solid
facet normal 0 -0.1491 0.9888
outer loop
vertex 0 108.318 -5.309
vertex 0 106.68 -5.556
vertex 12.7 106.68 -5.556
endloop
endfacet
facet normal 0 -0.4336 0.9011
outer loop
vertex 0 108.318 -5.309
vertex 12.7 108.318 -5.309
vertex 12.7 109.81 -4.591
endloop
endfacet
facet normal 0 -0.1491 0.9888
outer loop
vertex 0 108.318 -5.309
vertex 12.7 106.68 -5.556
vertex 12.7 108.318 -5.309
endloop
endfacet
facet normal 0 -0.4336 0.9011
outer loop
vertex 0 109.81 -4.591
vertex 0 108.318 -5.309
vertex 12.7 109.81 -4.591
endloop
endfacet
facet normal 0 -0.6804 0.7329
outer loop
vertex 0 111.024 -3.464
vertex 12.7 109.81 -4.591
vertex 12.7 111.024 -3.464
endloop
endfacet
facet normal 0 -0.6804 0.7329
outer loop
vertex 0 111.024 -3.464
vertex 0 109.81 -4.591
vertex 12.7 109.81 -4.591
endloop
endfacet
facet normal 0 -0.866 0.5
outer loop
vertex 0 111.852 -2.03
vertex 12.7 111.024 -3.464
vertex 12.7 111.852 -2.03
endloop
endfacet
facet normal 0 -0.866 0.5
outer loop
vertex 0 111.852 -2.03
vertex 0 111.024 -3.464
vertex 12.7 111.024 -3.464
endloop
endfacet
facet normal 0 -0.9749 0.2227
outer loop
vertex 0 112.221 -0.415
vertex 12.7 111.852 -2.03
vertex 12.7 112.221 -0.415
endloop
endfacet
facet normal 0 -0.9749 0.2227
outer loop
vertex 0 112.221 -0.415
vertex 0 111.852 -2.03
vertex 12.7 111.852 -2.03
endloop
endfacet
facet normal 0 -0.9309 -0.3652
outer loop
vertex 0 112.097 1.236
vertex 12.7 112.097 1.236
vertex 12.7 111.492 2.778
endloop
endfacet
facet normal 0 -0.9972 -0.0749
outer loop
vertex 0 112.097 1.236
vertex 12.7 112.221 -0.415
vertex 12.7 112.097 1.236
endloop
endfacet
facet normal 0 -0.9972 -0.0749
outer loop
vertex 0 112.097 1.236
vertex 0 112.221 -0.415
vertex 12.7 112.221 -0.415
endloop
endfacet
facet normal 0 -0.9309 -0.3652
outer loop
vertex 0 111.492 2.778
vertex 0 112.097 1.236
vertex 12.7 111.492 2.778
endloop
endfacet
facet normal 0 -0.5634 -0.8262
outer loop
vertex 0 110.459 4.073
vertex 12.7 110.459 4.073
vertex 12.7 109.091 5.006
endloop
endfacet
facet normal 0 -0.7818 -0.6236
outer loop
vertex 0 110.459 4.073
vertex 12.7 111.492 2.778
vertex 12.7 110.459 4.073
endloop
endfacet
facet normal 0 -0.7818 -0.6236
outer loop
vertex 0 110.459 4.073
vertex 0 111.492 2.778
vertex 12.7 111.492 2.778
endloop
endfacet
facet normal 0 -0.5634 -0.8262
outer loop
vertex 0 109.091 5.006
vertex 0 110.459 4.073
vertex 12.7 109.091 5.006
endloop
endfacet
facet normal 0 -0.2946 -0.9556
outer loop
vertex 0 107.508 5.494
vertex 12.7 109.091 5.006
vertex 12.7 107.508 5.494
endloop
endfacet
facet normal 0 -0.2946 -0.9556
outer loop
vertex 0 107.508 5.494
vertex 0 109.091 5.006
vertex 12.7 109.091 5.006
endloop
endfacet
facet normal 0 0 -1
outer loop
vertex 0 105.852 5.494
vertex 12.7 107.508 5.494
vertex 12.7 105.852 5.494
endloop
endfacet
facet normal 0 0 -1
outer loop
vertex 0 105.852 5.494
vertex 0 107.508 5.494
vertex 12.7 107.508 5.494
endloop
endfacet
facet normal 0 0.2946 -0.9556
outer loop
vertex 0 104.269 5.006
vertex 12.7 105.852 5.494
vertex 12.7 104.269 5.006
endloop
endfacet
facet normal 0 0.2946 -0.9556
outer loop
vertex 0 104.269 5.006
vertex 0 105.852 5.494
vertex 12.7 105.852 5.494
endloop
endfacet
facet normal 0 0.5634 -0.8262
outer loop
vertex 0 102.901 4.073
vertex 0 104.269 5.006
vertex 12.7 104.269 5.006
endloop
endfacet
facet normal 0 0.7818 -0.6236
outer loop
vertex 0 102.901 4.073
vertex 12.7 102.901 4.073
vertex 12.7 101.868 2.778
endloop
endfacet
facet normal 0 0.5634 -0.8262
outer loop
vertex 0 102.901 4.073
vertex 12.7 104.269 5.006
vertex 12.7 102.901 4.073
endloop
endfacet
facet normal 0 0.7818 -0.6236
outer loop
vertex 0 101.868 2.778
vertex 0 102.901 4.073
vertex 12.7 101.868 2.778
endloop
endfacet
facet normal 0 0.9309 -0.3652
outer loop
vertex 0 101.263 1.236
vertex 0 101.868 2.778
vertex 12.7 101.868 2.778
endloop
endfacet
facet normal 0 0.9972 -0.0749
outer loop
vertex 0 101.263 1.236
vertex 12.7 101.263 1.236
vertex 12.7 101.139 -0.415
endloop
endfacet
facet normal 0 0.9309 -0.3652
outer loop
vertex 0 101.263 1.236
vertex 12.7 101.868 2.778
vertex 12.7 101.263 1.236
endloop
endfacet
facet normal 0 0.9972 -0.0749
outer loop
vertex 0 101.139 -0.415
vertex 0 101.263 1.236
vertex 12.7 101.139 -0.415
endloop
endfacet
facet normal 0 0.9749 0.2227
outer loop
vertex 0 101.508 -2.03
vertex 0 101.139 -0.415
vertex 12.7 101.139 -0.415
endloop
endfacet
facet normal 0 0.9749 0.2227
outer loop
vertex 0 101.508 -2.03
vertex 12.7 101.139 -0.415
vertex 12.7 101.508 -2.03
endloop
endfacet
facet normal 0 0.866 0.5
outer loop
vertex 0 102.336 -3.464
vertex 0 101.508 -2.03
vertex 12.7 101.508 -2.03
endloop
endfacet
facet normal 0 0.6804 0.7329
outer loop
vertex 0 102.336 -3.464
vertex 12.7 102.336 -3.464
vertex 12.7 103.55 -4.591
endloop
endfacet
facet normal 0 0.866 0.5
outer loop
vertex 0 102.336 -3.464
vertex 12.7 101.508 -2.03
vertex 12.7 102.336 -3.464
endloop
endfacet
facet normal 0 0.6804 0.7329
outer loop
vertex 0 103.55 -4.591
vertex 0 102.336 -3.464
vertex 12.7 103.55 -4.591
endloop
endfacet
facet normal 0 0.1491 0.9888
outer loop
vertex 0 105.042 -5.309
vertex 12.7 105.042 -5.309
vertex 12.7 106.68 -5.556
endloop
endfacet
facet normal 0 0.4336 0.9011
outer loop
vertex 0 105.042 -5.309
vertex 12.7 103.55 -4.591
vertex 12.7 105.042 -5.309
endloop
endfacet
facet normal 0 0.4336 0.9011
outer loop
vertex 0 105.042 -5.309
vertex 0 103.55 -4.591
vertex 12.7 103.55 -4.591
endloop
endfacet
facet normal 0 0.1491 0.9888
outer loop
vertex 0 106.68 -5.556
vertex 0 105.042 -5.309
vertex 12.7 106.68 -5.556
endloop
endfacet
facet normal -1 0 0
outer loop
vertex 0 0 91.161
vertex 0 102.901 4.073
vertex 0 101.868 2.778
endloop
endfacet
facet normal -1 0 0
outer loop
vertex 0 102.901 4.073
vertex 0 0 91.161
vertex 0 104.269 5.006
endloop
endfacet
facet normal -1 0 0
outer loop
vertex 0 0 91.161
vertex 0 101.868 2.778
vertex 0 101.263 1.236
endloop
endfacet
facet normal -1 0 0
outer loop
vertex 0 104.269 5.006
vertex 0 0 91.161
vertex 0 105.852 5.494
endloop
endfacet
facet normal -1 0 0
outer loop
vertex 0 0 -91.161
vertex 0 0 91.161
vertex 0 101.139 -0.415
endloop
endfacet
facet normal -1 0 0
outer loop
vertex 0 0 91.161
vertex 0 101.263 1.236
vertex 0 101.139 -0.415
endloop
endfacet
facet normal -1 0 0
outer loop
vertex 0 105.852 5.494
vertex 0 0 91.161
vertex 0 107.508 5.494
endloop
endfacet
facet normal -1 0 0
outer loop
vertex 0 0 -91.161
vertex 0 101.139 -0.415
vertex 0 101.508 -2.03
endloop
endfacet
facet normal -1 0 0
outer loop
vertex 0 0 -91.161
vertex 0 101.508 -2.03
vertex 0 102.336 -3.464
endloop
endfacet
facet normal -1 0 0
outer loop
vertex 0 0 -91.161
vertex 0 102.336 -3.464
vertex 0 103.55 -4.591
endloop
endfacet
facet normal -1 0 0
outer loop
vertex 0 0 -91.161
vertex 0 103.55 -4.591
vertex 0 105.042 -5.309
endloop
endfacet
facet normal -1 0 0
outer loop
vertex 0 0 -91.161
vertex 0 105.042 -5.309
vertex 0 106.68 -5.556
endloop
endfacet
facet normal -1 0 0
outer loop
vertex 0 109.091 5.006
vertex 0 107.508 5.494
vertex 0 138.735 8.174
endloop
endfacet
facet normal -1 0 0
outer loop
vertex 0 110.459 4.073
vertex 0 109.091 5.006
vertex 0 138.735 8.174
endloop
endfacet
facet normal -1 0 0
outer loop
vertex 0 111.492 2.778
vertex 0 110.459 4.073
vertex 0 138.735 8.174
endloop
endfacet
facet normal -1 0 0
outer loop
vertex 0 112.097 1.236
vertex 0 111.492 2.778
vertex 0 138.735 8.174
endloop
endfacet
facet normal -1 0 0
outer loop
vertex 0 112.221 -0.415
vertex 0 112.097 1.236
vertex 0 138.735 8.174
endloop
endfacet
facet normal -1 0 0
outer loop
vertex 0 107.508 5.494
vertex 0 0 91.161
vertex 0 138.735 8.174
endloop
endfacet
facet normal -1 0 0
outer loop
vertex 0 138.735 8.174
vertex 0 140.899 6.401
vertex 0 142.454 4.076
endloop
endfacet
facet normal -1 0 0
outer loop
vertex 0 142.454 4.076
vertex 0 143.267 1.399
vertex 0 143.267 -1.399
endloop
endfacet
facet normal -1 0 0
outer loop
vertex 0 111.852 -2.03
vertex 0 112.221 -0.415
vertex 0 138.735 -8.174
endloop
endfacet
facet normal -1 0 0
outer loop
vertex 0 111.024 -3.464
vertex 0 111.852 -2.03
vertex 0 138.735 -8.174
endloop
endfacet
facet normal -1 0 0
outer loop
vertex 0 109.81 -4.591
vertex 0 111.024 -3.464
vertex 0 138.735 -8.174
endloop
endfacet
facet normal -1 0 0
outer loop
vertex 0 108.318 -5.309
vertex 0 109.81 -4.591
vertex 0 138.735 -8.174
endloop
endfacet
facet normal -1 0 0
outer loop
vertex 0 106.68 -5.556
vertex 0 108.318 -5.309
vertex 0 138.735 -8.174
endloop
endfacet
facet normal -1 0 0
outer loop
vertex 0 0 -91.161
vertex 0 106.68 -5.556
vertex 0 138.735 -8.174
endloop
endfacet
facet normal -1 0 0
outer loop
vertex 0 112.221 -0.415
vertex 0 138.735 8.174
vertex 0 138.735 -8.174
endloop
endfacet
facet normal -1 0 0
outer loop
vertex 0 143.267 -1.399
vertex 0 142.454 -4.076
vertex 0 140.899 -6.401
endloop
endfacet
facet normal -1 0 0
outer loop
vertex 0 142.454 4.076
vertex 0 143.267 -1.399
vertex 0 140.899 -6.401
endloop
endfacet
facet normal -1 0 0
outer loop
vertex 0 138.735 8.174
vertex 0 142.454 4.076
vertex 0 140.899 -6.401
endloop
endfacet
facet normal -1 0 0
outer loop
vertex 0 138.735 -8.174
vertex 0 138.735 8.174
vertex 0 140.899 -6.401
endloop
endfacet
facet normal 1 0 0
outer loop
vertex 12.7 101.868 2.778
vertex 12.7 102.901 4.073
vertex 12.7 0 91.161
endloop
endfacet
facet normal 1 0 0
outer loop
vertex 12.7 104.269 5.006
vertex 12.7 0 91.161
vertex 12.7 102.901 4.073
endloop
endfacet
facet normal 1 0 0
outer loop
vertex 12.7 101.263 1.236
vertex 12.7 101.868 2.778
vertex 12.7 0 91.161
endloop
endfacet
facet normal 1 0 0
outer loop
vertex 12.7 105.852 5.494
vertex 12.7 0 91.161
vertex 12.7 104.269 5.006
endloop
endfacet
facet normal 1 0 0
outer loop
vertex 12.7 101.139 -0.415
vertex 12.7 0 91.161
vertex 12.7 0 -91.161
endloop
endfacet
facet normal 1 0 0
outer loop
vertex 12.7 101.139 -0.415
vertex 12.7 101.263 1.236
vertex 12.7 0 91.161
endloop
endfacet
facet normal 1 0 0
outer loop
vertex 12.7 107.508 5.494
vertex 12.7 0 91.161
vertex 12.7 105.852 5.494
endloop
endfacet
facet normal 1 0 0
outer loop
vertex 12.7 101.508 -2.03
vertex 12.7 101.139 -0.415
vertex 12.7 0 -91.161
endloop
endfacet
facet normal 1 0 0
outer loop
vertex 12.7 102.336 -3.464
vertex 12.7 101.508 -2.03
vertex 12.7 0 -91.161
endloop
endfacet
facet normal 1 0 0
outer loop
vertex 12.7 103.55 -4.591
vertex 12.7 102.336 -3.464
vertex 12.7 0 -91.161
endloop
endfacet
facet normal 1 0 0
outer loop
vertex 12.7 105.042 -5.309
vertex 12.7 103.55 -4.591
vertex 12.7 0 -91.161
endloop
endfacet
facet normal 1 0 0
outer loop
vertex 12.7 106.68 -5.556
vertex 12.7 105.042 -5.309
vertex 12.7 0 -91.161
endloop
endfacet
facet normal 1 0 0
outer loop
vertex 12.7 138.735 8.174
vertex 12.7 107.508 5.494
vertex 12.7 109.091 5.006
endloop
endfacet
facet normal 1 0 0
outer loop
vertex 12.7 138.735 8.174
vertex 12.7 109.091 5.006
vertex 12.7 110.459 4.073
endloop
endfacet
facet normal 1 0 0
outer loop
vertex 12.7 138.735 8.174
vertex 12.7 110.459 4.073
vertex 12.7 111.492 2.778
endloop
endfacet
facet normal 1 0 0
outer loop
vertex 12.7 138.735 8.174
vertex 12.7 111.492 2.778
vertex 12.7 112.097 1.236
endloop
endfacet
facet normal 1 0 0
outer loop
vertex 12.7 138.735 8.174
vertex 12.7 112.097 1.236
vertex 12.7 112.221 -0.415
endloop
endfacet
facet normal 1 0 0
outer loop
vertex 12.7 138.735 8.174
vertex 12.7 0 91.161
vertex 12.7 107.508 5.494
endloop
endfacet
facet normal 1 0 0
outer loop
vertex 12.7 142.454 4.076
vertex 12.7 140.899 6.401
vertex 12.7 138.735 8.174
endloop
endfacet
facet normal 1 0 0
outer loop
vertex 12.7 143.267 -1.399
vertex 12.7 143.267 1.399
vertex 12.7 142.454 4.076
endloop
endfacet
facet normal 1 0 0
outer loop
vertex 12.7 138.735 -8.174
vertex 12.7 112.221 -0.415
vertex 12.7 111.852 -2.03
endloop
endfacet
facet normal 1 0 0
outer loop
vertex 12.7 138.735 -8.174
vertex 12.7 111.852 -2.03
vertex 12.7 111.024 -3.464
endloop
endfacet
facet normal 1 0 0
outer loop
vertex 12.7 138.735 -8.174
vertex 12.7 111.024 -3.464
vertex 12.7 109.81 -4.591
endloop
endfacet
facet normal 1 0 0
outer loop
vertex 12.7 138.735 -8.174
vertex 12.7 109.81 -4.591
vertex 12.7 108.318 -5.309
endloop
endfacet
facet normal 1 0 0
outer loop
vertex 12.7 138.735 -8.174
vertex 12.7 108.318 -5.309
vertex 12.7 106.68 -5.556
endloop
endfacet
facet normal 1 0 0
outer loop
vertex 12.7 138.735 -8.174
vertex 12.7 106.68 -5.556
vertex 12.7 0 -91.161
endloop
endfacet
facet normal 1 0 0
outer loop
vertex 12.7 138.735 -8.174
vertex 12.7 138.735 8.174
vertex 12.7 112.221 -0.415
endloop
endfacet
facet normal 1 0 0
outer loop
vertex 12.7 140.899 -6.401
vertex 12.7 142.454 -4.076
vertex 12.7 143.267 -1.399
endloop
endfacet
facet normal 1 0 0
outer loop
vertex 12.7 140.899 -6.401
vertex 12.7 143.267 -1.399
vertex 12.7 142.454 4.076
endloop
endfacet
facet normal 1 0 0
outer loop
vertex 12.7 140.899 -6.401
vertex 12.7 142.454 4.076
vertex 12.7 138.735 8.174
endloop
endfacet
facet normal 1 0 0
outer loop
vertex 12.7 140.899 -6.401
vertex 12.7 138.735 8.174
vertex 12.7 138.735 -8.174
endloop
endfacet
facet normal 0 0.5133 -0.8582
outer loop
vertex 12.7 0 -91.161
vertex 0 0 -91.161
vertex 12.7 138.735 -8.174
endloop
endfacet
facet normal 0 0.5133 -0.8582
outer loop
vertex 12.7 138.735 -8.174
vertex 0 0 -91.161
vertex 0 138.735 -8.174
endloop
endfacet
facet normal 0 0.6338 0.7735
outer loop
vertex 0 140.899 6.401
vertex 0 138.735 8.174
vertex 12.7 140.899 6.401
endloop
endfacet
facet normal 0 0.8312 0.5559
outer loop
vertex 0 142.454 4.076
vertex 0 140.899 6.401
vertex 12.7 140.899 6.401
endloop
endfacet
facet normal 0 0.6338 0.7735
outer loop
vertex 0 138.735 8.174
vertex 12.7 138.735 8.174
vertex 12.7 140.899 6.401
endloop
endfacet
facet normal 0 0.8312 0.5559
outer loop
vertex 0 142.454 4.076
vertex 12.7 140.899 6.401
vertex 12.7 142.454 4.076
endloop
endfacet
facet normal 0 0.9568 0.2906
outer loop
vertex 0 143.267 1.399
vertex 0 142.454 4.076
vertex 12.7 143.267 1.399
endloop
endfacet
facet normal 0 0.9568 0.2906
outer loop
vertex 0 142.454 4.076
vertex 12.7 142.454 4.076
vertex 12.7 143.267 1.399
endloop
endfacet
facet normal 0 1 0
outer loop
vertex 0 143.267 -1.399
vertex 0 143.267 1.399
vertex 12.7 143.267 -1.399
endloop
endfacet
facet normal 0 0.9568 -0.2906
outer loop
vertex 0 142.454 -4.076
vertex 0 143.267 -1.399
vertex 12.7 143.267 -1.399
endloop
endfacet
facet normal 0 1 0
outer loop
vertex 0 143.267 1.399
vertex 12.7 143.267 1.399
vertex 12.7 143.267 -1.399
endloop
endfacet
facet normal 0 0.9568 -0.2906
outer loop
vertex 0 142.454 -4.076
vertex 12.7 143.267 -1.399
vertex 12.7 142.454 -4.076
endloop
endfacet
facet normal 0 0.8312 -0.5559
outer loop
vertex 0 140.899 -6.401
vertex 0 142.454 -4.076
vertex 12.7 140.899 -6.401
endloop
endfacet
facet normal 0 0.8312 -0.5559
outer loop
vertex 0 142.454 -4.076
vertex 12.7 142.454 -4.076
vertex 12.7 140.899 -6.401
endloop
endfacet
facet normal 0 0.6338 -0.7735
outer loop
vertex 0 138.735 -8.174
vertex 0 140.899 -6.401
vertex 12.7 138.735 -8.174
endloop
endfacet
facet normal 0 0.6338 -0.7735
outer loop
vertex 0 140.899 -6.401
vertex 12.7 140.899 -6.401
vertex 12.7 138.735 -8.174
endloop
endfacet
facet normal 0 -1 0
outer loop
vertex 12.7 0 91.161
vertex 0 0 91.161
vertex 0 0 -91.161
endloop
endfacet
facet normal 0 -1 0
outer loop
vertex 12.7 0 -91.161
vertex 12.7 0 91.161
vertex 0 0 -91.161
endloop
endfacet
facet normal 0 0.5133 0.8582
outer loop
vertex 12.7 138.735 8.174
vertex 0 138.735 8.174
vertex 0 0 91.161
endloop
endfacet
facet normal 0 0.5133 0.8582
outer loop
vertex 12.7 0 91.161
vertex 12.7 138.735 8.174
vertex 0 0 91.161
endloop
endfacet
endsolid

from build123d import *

# Parameters (mm, degrees)
BOSS_EXTRUDE1_DEPTH     = 12.7
FILLET1_R               = 9.525
CUT_EXTRUDE3_DEPTH      = 171.371755619
CUT_EXTRUDE3_DEPTH_BACK = 171.371755619
SKETCH2_R               = 5.55625


with BuildPart() as part:
    # Sketch1 → Boss-Extrude1 (new body)
    with BuildSketch(Plane(origin=(0, 0, 0), x_dir=(0, 0, -1), z_dir=(1, 0, 0))):
        Polygon((0, 152.4), (-91.160761442, 0), (91.160761442, 0), align=None)
    extrude(amount=BOSS_EXTRUDE1_DEPTH)

    # Fillet1
    fillet1_edges = [part.edges().sort_by_distance(p)[0] for p in [
        (6.35, 152.4, 0),
    ]]
    fillet(fillet1_edges, radius=FILLET1_R)

    # Sketch2 → Cut-Extrude3 (cut, two sides: drawn at the far end of the back side and taken through both)
    with BuildSketch(Plane(origin=(0, 0, 0), x_dir=(0, 0, -1), z_dir=(1, 0, 0)).offset(-CUT_EXTRUDE3_DEPTH_BACK)):
        with Locations((0, 106.68)):
            Circle(SKETCH2_R)
    extrude(amount=CUT_EXTRUDE3_DEPTH + CUT_EXTRUDE3_DEPTH_BACK, mode=Mode.SUBTRACT)


solid = part.part
